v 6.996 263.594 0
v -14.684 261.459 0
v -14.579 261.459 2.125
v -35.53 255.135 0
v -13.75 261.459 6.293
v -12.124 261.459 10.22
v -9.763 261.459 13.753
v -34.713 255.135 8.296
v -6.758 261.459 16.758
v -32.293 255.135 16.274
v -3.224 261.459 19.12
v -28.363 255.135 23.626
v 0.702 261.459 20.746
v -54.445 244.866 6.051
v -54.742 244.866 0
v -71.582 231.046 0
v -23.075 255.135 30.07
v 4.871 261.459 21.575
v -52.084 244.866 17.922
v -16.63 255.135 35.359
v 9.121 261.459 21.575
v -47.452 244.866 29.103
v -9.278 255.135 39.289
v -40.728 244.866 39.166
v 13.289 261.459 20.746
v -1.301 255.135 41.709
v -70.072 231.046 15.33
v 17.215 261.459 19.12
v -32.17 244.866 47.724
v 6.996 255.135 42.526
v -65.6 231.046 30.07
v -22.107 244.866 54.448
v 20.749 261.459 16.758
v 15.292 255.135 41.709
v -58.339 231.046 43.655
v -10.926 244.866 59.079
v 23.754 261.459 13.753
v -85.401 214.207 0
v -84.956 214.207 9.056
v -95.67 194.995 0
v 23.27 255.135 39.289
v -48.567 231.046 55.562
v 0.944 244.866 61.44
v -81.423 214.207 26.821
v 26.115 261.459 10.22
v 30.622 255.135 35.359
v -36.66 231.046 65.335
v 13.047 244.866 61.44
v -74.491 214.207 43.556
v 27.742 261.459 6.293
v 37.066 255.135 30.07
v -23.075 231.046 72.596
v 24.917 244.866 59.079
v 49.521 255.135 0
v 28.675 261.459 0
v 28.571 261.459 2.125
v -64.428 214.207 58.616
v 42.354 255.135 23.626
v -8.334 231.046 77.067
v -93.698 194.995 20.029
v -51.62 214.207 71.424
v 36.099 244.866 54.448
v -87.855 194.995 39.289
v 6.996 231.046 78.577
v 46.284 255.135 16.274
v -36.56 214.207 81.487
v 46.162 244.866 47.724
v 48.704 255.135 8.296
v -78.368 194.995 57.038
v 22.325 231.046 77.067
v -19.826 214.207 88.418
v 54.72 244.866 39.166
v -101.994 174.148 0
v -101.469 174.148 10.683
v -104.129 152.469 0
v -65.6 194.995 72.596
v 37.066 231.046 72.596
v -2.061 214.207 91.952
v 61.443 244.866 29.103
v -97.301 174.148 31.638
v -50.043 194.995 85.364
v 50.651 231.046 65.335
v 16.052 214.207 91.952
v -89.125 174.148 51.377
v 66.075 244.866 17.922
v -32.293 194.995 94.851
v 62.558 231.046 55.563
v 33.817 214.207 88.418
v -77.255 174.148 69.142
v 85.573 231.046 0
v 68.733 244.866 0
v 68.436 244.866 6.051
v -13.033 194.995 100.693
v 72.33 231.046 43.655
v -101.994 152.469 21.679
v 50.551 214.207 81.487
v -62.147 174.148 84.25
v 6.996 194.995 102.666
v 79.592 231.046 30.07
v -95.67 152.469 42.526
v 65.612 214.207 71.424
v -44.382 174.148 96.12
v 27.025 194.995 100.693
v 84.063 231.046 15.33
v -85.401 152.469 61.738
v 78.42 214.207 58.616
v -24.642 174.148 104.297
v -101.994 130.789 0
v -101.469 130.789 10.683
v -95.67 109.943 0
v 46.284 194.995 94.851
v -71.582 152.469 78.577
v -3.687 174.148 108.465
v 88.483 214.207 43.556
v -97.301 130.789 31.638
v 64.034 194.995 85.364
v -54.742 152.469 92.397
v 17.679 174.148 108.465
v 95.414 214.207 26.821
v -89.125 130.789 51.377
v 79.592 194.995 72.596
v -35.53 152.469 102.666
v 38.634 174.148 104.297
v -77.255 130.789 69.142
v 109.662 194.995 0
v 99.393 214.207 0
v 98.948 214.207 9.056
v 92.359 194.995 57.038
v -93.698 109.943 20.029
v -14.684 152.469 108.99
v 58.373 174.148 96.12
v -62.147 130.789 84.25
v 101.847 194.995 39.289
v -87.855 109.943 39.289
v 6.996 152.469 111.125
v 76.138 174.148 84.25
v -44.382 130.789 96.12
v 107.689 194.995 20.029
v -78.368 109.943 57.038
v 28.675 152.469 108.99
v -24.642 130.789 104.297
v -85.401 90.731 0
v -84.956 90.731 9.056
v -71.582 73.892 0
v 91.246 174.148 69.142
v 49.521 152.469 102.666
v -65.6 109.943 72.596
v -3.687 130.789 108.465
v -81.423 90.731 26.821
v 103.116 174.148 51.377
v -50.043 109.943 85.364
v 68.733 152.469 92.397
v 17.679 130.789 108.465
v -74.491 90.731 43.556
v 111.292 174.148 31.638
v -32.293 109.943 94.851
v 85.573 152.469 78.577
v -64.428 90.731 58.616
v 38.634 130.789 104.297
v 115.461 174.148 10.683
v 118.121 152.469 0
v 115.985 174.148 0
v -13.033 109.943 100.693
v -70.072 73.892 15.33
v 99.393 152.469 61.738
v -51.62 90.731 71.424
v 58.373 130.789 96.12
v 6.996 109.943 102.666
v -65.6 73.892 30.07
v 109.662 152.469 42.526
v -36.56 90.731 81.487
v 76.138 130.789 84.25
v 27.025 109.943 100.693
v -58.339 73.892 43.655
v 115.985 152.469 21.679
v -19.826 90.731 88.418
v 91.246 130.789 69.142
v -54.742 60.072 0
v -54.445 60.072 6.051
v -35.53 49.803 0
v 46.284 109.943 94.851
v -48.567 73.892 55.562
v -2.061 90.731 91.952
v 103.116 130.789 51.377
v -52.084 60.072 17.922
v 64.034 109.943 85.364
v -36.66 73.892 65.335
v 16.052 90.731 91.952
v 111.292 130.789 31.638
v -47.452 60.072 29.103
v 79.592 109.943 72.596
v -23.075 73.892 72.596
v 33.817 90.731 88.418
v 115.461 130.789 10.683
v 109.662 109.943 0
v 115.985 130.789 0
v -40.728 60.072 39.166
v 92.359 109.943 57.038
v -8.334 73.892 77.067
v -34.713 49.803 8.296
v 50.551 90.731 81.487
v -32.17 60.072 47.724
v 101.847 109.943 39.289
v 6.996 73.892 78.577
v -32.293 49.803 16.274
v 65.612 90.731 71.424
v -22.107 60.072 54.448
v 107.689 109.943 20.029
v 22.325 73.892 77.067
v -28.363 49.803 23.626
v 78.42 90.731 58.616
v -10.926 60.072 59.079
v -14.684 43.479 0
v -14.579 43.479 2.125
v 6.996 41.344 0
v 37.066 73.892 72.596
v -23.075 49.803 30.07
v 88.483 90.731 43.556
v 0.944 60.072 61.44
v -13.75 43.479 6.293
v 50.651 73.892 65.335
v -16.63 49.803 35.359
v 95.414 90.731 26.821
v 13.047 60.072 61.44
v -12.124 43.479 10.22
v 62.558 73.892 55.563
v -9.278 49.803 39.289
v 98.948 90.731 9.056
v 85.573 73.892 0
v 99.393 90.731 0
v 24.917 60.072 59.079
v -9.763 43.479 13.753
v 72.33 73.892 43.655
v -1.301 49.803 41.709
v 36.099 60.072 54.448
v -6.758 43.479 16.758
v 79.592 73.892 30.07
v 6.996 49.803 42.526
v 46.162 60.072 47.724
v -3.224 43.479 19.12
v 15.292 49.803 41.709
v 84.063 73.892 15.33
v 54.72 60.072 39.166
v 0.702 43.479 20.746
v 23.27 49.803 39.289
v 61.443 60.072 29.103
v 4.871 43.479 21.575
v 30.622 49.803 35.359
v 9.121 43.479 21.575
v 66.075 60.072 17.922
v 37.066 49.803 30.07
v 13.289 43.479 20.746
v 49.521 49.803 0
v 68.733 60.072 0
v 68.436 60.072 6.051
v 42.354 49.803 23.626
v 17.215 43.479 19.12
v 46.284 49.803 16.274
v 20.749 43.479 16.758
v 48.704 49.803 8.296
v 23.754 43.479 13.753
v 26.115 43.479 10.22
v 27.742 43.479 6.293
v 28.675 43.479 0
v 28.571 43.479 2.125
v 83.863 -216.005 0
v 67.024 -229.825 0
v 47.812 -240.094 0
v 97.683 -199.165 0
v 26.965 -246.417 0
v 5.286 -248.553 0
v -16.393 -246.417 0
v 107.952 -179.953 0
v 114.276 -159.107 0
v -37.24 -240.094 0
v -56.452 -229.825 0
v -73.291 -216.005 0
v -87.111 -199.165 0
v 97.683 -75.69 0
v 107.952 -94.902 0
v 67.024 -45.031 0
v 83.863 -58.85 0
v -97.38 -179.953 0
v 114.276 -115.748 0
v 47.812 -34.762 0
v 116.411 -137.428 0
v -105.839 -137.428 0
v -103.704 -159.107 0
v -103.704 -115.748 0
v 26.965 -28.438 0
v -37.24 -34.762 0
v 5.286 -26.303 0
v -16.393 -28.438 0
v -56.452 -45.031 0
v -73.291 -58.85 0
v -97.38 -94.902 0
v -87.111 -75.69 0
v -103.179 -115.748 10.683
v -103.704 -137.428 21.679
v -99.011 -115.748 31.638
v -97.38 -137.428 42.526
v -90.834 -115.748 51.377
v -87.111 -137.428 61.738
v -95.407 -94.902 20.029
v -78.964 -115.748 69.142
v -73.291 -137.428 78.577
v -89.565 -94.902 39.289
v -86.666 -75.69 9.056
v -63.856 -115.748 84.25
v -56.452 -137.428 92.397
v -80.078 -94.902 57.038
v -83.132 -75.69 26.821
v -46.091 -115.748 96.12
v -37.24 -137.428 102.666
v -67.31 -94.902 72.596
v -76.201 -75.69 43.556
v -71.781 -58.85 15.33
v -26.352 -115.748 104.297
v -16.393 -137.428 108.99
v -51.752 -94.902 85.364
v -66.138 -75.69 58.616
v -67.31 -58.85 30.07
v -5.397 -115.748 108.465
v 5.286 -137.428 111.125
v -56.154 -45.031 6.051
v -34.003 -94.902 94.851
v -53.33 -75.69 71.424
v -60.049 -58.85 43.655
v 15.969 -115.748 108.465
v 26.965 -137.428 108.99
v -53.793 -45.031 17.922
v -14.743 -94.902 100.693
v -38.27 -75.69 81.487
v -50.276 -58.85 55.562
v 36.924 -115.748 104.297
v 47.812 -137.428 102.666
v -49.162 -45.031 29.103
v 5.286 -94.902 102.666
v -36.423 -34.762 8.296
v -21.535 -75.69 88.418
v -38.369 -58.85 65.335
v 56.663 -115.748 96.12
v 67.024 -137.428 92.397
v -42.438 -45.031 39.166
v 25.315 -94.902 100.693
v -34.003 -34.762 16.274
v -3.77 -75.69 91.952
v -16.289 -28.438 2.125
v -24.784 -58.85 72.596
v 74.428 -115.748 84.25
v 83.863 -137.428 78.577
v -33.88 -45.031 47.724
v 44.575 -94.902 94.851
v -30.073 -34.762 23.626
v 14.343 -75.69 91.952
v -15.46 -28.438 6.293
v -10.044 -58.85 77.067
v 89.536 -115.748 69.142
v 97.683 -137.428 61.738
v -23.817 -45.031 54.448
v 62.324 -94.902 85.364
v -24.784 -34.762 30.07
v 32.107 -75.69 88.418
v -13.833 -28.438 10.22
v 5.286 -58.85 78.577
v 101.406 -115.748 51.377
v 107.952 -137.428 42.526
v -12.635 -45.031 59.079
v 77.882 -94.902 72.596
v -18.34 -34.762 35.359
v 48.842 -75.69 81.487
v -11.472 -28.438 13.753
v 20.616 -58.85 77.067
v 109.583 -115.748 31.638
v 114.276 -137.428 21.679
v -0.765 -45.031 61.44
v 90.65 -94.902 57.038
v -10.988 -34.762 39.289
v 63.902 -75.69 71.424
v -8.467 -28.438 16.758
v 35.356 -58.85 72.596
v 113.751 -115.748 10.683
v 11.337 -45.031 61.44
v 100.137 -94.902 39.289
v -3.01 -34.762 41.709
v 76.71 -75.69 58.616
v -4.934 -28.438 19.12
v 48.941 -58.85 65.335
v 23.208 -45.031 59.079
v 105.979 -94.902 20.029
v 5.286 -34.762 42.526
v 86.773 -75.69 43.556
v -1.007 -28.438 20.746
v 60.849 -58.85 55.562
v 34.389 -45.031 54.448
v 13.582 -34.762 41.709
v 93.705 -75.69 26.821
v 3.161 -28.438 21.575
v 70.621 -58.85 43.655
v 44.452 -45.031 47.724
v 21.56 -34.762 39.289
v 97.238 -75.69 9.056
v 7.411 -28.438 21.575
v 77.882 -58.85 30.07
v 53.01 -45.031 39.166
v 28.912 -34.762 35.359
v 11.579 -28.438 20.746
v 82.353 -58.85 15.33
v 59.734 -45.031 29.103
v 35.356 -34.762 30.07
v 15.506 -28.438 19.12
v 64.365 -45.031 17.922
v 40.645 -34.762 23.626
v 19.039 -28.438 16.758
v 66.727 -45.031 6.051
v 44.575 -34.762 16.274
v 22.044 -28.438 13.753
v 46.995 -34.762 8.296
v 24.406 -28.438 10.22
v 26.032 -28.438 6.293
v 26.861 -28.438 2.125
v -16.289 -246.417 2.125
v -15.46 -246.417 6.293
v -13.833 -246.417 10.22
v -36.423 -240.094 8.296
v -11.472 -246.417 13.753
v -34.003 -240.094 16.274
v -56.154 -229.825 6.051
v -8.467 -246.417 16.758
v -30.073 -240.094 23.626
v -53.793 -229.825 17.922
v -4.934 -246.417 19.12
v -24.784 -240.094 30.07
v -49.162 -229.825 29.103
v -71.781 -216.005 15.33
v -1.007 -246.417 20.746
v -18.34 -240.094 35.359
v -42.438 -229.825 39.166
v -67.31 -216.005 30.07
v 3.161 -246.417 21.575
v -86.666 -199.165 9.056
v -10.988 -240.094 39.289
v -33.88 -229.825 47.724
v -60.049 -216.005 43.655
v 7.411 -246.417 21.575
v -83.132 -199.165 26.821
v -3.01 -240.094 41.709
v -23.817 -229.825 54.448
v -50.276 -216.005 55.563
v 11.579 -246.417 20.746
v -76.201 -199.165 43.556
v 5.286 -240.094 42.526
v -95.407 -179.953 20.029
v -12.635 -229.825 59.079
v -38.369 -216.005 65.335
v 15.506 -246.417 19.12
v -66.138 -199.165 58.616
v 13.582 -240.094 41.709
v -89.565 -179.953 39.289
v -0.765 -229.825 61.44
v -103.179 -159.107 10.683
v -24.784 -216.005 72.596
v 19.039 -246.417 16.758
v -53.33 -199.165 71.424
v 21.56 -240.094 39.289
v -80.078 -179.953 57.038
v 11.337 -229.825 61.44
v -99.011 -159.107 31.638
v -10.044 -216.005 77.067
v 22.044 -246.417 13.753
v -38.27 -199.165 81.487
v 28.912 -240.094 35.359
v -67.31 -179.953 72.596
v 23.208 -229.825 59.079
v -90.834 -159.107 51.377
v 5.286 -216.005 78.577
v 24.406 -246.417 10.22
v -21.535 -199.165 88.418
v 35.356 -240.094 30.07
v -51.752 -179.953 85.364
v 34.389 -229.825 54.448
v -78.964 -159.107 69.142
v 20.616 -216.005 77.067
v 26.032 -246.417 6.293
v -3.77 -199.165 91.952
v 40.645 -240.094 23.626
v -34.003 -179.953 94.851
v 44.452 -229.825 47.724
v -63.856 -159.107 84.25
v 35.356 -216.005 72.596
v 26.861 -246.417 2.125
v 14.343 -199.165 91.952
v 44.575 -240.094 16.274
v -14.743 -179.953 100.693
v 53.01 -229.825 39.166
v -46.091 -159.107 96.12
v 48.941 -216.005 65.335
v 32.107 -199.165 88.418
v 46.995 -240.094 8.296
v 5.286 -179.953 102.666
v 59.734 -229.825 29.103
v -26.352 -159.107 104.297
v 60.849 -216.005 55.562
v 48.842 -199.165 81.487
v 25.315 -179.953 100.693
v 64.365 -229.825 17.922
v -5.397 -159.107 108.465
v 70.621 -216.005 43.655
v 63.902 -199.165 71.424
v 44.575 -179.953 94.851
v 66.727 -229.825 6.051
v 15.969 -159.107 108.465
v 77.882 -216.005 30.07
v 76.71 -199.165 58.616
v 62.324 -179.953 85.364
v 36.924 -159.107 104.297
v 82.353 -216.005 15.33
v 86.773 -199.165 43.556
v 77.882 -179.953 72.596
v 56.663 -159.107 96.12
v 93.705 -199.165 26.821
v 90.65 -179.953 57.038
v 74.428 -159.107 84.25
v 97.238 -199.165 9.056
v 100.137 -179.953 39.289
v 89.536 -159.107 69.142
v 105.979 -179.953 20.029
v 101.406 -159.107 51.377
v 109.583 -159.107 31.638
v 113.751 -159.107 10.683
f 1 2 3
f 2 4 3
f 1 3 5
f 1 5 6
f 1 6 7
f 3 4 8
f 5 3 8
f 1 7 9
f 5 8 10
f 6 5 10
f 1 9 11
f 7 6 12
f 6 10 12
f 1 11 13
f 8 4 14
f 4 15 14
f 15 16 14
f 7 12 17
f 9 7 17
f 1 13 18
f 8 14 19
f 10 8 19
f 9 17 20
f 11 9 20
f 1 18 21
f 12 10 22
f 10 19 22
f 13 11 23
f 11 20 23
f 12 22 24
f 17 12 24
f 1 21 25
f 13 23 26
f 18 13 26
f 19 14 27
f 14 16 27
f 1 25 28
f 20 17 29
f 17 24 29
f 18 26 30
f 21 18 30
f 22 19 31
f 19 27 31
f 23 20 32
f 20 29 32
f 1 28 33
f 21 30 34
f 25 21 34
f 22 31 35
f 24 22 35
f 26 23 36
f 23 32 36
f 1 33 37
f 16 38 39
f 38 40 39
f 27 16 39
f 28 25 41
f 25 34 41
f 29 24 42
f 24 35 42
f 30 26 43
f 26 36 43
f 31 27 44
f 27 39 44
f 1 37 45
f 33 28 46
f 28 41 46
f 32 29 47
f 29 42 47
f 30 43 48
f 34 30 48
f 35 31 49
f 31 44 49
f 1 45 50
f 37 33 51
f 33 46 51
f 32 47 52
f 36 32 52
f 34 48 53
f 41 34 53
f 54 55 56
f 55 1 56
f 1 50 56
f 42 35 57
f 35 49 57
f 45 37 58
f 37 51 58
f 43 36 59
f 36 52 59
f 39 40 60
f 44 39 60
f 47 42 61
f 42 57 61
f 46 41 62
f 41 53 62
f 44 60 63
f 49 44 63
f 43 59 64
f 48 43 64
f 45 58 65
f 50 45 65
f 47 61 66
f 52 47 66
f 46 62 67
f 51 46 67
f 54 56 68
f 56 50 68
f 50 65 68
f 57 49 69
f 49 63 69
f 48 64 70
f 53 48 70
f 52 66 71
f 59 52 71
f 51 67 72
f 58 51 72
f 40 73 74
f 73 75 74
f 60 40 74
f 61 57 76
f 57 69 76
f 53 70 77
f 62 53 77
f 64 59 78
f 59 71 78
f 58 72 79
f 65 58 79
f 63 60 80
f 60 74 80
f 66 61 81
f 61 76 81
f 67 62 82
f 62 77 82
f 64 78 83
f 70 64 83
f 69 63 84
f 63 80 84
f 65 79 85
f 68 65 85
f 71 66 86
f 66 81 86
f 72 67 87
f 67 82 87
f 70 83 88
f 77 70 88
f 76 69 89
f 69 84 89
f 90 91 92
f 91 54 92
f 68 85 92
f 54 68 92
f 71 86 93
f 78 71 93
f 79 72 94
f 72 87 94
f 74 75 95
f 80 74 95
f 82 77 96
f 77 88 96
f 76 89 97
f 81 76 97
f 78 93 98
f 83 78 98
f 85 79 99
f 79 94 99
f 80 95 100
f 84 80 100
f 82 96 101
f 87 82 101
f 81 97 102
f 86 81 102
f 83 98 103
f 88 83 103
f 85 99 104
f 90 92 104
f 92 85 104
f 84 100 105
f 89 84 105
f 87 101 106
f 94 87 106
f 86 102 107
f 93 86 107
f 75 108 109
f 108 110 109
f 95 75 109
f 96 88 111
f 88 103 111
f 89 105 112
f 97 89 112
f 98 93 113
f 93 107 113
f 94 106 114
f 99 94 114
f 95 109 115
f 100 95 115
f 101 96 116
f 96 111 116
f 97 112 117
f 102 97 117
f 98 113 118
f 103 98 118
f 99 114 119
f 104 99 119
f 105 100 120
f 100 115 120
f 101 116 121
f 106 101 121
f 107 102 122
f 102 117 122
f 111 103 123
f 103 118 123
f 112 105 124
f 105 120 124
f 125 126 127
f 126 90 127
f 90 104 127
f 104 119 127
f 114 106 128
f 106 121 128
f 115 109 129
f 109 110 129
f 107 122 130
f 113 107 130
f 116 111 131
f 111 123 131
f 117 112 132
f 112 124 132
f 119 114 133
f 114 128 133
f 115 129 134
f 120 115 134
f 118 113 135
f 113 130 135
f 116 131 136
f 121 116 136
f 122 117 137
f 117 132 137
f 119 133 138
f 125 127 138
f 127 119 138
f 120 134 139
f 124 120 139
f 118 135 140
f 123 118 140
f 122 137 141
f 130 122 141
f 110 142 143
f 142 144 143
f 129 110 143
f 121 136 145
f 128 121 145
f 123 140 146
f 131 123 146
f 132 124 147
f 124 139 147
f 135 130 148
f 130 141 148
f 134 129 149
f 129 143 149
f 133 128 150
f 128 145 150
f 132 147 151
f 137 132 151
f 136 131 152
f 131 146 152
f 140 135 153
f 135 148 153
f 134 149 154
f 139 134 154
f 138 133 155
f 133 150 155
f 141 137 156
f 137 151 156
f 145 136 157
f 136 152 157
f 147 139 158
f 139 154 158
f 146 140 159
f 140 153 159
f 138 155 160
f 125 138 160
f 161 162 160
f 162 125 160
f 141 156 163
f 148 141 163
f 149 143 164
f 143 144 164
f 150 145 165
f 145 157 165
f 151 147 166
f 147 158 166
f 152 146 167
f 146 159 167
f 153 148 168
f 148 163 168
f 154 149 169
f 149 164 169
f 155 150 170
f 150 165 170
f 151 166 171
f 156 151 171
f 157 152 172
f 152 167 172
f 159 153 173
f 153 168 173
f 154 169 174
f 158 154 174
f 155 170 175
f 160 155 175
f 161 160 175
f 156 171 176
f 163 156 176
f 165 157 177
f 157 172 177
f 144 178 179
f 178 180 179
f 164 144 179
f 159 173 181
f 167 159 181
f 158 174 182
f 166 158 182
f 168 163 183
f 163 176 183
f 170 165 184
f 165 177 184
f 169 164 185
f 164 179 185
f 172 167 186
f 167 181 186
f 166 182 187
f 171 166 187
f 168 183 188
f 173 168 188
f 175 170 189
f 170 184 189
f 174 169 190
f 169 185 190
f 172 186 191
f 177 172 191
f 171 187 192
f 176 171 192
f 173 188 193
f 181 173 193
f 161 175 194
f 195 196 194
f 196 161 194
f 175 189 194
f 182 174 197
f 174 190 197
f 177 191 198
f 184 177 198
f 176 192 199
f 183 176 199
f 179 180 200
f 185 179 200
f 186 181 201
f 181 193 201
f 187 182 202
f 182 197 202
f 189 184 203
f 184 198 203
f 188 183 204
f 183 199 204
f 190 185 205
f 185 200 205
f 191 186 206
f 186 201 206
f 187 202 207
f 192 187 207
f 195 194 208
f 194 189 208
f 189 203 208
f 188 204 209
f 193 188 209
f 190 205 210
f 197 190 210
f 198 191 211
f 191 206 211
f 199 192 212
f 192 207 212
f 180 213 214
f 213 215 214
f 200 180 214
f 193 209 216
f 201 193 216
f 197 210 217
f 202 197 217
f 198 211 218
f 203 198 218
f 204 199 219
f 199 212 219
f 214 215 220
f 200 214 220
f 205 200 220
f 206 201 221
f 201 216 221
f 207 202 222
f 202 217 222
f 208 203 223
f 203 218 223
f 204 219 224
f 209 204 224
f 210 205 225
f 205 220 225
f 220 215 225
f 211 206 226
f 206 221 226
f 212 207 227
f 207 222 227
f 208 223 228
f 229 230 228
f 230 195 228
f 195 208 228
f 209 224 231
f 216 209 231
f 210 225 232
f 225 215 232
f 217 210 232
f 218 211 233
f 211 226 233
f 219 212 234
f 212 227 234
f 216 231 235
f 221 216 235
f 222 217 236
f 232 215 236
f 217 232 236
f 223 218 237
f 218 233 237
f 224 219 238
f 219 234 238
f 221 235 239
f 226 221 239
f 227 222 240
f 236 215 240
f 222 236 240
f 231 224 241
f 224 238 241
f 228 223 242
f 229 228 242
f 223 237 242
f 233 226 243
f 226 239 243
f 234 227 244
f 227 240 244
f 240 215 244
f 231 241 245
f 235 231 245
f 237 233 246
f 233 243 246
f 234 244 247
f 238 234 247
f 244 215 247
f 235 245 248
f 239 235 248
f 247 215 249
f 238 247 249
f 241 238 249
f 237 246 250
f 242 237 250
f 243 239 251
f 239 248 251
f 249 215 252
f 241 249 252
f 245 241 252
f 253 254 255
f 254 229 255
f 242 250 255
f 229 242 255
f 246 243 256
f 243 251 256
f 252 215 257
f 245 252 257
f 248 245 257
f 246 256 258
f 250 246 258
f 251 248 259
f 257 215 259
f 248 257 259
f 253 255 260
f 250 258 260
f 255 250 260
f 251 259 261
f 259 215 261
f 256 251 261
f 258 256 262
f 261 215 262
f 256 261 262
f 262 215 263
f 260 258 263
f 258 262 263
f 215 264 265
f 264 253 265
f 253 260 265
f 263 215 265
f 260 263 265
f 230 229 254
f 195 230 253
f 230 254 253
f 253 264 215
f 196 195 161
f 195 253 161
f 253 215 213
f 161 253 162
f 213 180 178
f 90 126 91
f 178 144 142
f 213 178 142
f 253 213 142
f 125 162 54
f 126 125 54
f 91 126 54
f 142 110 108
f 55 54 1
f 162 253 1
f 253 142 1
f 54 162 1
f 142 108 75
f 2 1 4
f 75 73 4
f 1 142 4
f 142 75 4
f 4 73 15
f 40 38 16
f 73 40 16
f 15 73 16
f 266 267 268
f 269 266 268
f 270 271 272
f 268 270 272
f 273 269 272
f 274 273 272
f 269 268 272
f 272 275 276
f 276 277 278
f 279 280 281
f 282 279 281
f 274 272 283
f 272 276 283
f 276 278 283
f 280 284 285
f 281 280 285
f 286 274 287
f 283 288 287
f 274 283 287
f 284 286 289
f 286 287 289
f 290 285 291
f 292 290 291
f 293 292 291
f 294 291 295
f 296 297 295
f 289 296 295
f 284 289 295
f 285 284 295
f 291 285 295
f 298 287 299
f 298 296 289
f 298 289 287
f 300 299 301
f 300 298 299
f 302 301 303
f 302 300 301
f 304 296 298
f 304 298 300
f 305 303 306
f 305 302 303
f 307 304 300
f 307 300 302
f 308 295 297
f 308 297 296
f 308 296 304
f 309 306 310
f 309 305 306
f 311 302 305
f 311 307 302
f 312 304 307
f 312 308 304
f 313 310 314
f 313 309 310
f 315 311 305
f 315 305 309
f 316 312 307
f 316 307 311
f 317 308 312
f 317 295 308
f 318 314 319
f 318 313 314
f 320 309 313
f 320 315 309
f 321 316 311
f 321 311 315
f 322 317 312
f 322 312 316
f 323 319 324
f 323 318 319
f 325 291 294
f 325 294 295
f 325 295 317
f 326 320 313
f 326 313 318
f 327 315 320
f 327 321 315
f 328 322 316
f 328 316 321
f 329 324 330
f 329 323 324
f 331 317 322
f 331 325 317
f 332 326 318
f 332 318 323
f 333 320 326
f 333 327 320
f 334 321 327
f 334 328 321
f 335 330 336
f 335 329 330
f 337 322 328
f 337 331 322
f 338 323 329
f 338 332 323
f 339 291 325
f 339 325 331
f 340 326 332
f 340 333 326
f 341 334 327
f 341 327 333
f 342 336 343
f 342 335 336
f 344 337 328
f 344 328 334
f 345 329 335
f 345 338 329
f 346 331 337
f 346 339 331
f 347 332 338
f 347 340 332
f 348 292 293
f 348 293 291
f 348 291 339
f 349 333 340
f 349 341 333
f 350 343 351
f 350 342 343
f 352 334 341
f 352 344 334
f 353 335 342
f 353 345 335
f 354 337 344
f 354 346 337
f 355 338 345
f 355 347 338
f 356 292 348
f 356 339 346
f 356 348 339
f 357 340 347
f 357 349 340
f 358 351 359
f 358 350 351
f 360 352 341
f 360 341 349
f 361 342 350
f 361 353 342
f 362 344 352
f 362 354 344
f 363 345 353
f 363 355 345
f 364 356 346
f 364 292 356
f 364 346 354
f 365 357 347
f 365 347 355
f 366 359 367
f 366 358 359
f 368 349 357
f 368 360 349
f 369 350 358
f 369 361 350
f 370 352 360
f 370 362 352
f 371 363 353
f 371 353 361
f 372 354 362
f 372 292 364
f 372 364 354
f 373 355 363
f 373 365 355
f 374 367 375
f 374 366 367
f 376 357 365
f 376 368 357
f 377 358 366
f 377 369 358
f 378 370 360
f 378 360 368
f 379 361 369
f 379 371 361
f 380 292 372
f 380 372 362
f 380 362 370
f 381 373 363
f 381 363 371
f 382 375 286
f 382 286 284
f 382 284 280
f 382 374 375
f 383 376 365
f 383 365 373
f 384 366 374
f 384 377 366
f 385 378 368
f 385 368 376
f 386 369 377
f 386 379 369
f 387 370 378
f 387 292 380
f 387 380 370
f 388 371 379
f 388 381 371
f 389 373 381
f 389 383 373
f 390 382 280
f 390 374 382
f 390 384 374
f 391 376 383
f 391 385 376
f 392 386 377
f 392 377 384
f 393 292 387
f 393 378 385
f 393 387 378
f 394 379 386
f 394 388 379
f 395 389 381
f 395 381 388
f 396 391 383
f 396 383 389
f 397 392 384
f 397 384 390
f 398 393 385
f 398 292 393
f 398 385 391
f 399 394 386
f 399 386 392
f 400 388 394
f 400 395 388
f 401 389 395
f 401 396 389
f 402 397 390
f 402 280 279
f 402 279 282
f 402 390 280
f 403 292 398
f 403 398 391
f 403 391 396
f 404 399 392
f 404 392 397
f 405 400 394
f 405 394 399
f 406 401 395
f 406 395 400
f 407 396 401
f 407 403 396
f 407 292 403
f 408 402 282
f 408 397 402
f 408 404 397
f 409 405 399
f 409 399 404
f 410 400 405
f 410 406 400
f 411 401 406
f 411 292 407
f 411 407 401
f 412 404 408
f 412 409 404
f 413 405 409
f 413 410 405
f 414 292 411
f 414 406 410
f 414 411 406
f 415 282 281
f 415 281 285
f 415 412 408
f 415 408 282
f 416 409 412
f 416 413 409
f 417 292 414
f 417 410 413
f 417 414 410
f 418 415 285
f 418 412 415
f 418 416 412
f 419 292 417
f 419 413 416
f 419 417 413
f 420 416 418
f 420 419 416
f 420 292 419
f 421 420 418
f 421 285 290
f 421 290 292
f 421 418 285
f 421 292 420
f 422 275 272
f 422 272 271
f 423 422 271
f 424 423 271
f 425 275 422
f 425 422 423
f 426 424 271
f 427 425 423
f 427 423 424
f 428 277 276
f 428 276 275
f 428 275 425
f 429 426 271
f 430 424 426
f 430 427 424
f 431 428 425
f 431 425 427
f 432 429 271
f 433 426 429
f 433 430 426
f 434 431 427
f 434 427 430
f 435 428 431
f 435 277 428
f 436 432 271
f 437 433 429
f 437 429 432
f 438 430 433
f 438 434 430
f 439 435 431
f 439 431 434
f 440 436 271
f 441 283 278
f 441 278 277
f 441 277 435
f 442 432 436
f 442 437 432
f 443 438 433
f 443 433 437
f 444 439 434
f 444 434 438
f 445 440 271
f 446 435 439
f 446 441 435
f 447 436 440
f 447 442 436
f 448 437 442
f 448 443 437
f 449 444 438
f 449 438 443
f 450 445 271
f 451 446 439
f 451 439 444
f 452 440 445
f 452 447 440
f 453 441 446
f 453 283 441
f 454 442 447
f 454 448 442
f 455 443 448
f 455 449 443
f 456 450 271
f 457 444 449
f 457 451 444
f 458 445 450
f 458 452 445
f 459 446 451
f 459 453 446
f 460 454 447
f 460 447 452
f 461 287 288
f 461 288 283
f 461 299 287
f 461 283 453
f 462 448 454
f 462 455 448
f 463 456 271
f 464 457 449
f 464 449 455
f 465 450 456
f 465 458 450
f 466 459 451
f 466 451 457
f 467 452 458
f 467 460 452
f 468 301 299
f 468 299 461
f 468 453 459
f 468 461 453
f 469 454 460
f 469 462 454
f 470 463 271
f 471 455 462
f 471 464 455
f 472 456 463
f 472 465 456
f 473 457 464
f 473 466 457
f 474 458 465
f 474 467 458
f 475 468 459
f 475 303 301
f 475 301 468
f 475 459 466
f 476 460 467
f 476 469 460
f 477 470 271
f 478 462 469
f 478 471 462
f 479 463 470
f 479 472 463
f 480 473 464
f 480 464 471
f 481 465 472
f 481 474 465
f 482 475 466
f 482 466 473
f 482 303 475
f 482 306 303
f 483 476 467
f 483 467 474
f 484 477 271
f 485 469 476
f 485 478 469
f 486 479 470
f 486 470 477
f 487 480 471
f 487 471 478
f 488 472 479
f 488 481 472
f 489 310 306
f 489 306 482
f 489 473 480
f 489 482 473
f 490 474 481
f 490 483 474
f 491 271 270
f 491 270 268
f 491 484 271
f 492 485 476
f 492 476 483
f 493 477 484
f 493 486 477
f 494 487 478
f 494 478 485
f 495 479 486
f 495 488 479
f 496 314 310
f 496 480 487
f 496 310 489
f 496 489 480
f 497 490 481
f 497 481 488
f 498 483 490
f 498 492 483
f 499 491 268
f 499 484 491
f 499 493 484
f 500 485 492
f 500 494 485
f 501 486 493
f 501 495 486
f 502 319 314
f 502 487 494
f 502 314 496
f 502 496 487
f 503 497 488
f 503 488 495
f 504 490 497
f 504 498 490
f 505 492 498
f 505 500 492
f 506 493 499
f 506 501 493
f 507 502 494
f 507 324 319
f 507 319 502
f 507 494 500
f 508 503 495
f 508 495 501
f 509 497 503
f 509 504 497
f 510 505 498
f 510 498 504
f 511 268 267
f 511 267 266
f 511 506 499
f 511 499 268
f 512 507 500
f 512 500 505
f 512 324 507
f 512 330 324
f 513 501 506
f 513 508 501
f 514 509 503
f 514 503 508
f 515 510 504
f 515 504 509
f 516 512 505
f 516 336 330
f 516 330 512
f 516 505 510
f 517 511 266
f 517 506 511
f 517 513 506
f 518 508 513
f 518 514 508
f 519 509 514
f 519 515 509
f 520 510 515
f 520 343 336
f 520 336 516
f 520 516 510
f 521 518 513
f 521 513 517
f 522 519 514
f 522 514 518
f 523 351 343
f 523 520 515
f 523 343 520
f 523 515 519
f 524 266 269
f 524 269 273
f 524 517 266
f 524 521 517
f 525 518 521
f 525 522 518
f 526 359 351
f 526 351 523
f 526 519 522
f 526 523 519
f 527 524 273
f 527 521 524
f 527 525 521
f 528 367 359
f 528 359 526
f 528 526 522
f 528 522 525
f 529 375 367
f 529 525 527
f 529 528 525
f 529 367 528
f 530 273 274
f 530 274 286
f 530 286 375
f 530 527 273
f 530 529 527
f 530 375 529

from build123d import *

# Parameters (mm, degrees)
F3_W          = 606.7284047604
F3_H          = 134.0230405331
F4_DEPTH      = 203.2
F4_DEPTH_BACK = 203.2


with BuildPart() as f1:
    # F0 (on Top) → F1 (revolve)
    with BuildSketch(Plane.XY):
        with BuildLine():
            ThreePointArc((116.4110448, -137.4276144), (83.8632858594, -58.8503733406), (5.2860448, -26.3026144))
            Line((5.2860448, -26.3026144), (5.2860448, -134.2526144))
            ThreePointArc((5.2860448, -134.2526144), (7.5311088303, -135.1825503697), (8.4610448, -137.4276144))
            ThreePointArc((8.4610448, -137.4276144), (7.5311088303, -139.6726784303), (5.2860448, -140.6026144))
            Line((5.2860448, -140.6026144), (5.2860448, -248.5526144))
            ThreePointArc((5.2860448, -248.5526144), (83.8632858594, -216.0048554594), (116.4110448, -137.4276144))
        make_face()
        with BuildLine():
            ThreePointArc((8.4610448, -137.4276144), (7.5311088303, -135.1825503697), (5.2860448, -134.2526144))
            Line((5.2860448, -134.2526144), (5.2860448, -140.6026144))
            ThreePointArc((5.2860448, -140.6026144), (7.5311088303, -139.6726784303), (8.4610448, -137.4276144))
        make_face()
    revolve(axis=Axis((5.2860448, -137.4276144, 0), (0, 1, 0)))


with BuildPart() as f2:
    # F0 (on Top) → F2 (revolve)
    with BuildSketch(Plane.XY):
        with BuildLine():
            Line((6.995668, 155.6438086), (6.995668, 263.5938086))
            ThreePointArc((6.995668, 263.5938086), (-104.129332, 152.4688086), (6.995668, 41.3438086))
            Line((6.995668, 41.3438086), (6.995668, 149.2938086))
            ThreePointArc((6.995668, 149.2938086), (4.7506039697, 150.2237445697), (3.820668, 152.4688086))
            ThreePointArc((3.820668, 152.4688086), (4.7506039697, 154.7138726303), (6.995668, 155.6438086))
        make_face()
        with BuildLine():
            Line((6.995668, 149.2938086), (6.995668, 155.6438086))
            ThreePointArc((6.995668, 155.6438086), (4.7506039697, 154.7138726303), (3.820668, 152.4688086))
            ThreePointArc((3.820668, 152.4688086), (4.7506039697, 150.2237445697), (6.995668, 149.2938086))
        make_face()
    revolve(axis=Axis((6.995668, 152.4688086, 0), (0, 1, 0)))


with BuildPart() as f4_tool:
    # F3 (on Right) → F4 (new body, two sides)
    with BuildSketch(Plane.YZ) as f4_sk:
        with Locations((0.1858919859, -67.0115202665)):
            Rectangle(F3_W, F3_H)
    extrude(amount=-F4_DEPTH)
    extrude(f4_sk.sketch, amount=F4_DEPTH_BACK)


with BuildPart() as f1_1:
    add(f1.part)

    # F4: cut by f4_tool
    add(f4_tool.part, mode=Mode.SUBTRACT)


with BuildPart() as f2_1:
    add(f2.part)

    # F4: cut by f4_tool
    add(f4_tool.part, mode=Mode.SUBTRACT)


solid = Compound([f1_1.part, f2_1.part])
